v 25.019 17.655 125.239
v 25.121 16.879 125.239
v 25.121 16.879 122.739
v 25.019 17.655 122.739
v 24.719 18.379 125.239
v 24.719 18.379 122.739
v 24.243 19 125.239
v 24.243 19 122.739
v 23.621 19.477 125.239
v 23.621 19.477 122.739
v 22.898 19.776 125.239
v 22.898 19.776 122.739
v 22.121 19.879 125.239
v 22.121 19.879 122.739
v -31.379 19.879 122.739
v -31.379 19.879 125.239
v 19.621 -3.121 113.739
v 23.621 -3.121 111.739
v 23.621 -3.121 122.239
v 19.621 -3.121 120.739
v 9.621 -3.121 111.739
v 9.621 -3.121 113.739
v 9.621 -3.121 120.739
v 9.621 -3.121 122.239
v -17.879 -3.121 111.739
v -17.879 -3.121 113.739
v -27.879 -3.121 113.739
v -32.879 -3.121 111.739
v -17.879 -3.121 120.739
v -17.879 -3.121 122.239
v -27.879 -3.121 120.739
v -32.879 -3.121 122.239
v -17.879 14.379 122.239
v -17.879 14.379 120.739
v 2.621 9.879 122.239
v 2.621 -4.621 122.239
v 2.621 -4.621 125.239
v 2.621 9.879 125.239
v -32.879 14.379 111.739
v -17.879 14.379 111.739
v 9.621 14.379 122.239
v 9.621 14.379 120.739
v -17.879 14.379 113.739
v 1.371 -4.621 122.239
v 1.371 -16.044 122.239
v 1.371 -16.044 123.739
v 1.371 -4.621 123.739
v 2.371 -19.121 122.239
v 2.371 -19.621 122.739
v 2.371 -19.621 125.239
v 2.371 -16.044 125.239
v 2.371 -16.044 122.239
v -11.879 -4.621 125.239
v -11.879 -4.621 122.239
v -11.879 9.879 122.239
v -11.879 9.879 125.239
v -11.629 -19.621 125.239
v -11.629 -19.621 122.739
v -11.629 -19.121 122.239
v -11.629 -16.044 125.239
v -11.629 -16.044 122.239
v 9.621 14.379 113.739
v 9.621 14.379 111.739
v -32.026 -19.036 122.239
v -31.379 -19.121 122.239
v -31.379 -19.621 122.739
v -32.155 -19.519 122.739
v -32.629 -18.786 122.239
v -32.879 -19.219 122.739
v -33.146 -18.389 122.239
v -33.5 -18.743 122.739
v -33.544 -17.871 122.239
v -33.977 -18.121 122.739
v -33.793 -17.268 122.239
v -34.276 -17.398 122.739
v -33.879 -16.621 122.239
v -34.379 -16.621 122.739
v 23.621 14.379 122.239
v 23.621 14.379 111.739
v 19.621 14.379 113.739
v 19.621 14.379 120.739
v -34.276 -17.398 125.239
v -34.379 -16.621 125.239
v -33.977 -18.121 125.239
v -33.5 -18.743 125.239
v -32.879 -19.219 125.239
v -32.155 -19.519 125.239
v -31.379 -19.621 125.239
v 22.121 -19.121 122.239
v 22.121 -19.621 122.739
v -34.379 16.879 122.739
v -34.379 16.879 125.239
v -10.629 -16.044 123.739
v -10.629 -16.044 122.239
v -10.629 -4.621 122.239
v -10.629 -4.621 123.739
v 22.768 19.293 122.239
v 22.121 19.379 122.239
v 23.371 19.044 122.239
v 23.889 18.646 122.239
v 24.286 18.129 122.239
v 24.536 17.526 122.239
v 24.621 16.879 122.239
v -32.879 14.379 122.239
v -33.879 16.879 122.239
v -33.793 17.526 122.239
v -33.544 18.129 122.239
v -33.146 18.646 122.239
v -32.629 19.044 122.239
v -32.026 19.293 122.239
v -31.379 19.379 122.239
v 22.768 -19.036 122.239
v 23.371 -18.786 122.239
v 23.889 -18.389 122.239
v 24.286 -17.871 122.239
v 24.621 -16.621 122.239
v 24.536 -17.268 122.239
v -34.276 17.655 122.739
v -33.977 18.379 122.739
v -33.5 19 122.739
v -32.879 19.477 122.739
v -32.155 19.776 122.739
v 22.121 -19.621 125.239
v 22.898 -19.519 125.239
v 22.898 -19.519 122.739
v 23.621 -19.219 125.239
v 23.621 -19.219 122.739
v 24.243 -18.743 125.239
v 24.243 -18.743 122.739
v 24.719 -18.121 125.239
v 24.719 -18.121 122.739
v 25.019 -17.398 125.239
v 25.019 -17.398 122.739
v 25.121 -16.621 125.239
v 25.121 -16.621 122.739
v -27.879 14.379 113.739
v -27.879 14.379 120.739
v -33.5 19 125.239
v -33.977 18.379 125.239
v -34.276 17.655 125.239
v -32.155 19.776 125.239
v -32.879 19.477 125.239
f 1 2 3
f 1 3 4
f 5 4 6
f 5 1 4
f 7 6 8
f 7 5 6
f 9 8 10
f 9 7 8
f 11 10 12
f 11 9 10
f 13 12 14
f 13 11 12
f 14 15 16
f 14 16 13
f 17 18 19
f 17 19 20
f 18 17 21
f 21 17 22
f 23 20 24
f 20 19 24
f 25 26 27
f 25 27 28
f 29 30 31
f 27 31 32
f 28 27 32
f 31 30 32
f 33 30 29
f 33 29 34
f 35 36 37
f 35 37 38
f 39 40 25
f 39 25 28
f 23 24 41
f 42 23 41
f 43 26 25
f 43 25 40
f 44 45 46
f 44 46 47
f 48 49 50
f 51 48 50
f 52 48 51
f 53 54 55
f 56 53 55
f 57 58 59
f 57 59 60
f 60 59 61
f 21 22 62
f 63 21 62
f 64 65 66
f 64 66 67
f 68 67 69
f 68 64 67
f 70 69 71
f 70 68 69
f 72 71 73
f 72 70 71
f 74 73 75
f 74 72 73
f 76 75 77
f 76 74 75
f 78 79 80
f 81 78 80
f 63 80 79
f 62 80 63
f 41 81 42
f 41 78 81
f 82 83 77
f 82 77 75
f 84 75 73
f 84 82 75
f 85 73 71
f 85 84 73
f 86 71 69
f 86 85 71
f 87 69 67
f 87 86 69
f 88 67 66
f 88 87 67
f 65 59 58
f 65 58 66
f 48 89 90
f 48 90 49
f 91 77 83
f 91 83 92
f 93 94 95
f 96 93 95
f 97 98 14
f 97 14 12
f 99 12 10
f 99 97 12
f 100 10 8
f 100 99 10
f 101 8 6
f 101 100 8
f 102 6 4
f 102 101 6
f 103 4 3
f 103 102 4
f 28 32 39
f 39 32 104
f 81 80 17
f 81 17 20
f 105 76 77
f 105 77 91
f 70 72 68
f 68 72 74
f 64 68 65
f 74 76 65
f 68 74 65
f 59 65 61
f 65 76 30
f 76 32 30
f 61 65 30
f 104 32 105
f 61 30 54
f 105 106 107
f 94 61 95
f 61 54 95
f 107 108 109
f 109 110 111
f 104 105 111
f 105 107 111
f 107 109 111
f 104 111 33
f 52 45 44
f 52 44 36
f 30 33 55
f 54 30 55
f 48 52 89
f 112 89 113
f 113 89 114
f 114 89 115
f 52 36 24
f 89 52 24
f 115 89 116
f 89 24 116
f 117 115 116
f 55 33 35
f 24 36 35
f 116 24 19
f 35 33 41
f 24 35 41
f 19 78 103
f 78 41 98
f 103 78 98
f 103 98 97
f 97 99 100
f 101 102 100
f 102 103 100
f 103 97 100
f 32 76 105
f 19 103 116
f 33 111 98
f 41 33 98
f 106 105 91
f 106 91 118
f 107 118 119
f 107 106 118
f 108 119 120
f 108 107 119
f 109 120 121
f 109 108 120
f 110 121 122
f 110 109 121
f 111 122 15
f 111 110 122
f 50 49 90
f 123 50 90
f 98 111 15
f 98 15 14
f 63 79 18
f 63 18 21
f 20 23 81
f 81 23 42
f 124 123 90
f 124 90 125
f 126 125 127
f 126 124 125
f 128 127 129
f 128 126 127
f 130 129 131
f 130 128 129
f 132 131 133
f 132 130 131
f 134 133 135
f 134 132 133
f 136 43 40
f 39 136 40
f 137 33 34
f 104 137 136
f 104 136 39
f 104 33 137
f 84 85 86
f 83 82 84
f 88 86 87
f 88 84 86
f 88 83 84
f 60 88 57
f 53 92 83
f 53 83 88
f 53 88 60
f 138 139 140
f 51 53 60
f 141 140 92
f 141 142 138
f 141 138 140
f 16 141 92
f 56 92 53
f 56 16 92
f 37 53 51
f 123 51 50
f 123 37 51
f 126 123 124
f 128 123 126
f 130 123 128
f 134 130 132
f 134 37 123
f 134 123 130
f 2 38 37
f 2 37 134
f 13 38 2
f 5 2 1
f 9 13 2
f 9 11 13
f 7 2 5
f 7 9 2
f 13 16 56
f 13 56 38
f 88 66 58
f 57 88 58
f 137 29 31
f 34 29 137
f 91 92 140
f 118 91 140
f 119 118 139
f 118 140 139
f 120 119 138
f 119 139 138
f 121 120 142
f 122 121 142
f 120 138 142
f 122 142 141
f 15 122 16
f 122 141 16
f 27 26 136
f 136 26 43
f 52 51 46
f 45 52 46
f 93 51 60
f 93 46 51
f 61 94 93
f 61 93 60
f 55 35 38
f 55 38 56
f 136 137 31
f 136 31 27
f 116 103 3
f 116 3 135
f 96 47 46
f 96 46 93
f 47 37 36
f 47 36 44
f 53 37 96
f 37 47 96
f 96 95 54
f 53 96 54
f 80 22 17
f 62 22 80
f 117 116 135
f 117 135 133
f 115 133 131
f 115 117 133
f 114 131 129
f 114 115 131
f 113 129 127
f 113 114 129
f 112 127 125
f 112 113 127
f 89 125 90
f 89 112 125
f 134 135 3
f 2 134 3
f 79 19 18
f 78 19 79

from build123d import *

# Parameters (mm, degrees)
SKETCH2_W           = 59.5
SKETCH2_H           = 39.5
BOSS_EXTRUDE1_DEPTH = 3
FILLET1_R           = 3
CHAMFER1_SIZE       = 0.5
SKETCH3_W           = 14
SKETCH3_H           = 17.5
SKETCH3_W_2         = 15
BOSS_EXTRUDE2_DEPTH = 10.5
CUT_EXTRUDE1_REACH  = 43.077
SKETCH4_W           = 14
SKETCH4_H           = 3.577165811
SKETCH4_W_2         = 14.5
SKETCH4_H_2         = 14.5
SKETCH5_W           = 12
SKETCH5_H           = 15
CUT_EXTRUDE2_DEPTH  = 1.5
SKETCH6_W           = 7
SKETCH6_H           = 17.5
CUT_EXTRUDE3_DEPTH  = 10
SKETCH7_W           = 7
SKETCH7_H           = 17.5
CUT_EXTRUDE4_DEPTH  = 10


with BuildPart() as part:
    # Sketch2 → Boss-Extrude1 (new body)
    with BuildSketch(Plane.XY.offset(122.238514037)):
        with Locations((-4.628679656, 0.128679656)):
            Rectangle(SKETCH2_W, SKETCH2_H)
    extrude(amount=BOSS_EXTRUDE1_DEPTH)

    # Fillet1
    fillet1_edges = [part.edges().sort_by_distance(p)[0] for p in [
        (-34.378679656, 19.878679656, 123.738514037),
        (25.121320344, 19.878679656, 123.738514037),
        (25.121320344, -19.621320344, 123.738514037),
        (-34.378679656, -19.621320344, 123.738514037),
    ]]
    fillet(fillet1_edges, radius=FILLET1_R)

    # Chamfer1
    chamfer1_edges = [part.edges().sort_by_distance(p)[0] for p in [
        (-34.378679656, 0.128679656, 122.238514037),
        (-4.628679656, 19.878679656, 122.238514037),
        (25.121320344, 0.128679656, 122.238514037),
        (-4.628679656, -19.621320344, 122.238514037),
        (-33.5, -18.742640687, 122.238514037),
        (24.242640687, -18.742640687, 122.238514037),
        (24.242640687, 19, 122.238514037),
        (-33.5, 19, 122.238514037),
    ]]
    chamfer(chamfer1_edges, length=CHAMFER1_SIZE)

    # Sketch3 → Boss-Extrude2 (add)
    with BuildSketch(Plane(origin=(0, 0, 122.238514037), x_dir=(-1, 0, 0), z_dir=(0, 0, -1))):
        with Locations((-16.621320344, 5.628679656)):
            Rectangle(SKETCH3_W, SKETCH3_H)
        with Locations((25.378679656, 5.628679656)):
            Rectangle(SKETCH3_W_2, SKETCH3_H)
    extrude(amount=BOSS_EXTRUDE2_DEPTH)

    # Sketch4 → Cut-Extrude1 (cut, up to next)
    with BuildSketch(Plane(origin=(0, 0, 122.238514037), x_dir=(-1, 0, 0), z_dir=(0, 0, -1)), mode=Mode.PRIVATE) as cut_extrude1_sk1:
        with Locations((4.628679656, -17.832737439)):
            Rectangle(SKETCH4_W, SKETCH4_H)
    cut_extrude1_tool1 = extrude(cut_extrude1_sk1.sketch, amount=-CUT_EXTRUDE1_REACH, mode=Mode.PRIVATE) & part.part
    # Sketch4 → Cut-Extrude1 (cut, up to next)
    with BuildSketch(Plane(origin=(0, 0, 122.238514037), x_dir=(-1, 0, 0), z_dir=(0, 0, -1)), mode=Mode.PRIVATE) as cut_extrude1_sk2:
        with Locations((4.628679656, 2.628679656)):
            Rectangle(SKETCH4_W_2, SKETCH4_H_2)
    cut_extrude1_tool2 = extrude(cut_extrude1_sk2.sketch, amount=-CUT_EXTRUDE1_REACH, mode=Mode.PRIVATE) & part.part
    add(cut_extrude1_tool1.solids().sort_by_distance((-4.62868, -17.832737, 122.238514))[0], mode=Mode.SUBTRACT)
    add(cut_extrude1_tool2.solids().sort_by_distance((-4.62868, 2.62868, 122.238514))[0], mode=Mode.SUBTRACT)

    # Sketch5 → Cut-Extrude2 (cut)
    with BuildSketch(Plane(origin=(0, 0, 122.238514037), x_dir=(-1, 0, 0), z_dir=(0, 0, -1))):
        with Locations((4.628679656, -8.544154533)):
            Rectangle(SKETCH5_W, SKETCH5_H)
    extrude(amount=-CUT_EXTRUDE2_DEPTH, mode=Mode.SUBTRACT)

    # Sketch6 → Cut-Extrude3 (cut)
    with BuildSketch(Plane.ZY.offset(-9.621320344)):
        with Locations((117.238514037, 5.628679656)):
            Rectangle(SKETCH6_W, SKETCH6_H)
    extrude(amount=-CUT_EXTRUDE3_DEPTH, mode=Mode.SUBTRACT)

    # Sketch7 → Cut-Extrude4 (cut)
    with BuildSketch(Plane(origin=(-17.878679656, 0, 0), x_dir=(0, 0, -1), z_dir=(1, 0, 0))):
        with Locations((-117.238514037, 5.628679656)):
            Rectangle(SKETCH7_W, SKETCH7_H)
    extrude(amount=-CUT_EXTRUDE4_DEPTH, mode=Mode.SUBTRACT)


solid = part.part
